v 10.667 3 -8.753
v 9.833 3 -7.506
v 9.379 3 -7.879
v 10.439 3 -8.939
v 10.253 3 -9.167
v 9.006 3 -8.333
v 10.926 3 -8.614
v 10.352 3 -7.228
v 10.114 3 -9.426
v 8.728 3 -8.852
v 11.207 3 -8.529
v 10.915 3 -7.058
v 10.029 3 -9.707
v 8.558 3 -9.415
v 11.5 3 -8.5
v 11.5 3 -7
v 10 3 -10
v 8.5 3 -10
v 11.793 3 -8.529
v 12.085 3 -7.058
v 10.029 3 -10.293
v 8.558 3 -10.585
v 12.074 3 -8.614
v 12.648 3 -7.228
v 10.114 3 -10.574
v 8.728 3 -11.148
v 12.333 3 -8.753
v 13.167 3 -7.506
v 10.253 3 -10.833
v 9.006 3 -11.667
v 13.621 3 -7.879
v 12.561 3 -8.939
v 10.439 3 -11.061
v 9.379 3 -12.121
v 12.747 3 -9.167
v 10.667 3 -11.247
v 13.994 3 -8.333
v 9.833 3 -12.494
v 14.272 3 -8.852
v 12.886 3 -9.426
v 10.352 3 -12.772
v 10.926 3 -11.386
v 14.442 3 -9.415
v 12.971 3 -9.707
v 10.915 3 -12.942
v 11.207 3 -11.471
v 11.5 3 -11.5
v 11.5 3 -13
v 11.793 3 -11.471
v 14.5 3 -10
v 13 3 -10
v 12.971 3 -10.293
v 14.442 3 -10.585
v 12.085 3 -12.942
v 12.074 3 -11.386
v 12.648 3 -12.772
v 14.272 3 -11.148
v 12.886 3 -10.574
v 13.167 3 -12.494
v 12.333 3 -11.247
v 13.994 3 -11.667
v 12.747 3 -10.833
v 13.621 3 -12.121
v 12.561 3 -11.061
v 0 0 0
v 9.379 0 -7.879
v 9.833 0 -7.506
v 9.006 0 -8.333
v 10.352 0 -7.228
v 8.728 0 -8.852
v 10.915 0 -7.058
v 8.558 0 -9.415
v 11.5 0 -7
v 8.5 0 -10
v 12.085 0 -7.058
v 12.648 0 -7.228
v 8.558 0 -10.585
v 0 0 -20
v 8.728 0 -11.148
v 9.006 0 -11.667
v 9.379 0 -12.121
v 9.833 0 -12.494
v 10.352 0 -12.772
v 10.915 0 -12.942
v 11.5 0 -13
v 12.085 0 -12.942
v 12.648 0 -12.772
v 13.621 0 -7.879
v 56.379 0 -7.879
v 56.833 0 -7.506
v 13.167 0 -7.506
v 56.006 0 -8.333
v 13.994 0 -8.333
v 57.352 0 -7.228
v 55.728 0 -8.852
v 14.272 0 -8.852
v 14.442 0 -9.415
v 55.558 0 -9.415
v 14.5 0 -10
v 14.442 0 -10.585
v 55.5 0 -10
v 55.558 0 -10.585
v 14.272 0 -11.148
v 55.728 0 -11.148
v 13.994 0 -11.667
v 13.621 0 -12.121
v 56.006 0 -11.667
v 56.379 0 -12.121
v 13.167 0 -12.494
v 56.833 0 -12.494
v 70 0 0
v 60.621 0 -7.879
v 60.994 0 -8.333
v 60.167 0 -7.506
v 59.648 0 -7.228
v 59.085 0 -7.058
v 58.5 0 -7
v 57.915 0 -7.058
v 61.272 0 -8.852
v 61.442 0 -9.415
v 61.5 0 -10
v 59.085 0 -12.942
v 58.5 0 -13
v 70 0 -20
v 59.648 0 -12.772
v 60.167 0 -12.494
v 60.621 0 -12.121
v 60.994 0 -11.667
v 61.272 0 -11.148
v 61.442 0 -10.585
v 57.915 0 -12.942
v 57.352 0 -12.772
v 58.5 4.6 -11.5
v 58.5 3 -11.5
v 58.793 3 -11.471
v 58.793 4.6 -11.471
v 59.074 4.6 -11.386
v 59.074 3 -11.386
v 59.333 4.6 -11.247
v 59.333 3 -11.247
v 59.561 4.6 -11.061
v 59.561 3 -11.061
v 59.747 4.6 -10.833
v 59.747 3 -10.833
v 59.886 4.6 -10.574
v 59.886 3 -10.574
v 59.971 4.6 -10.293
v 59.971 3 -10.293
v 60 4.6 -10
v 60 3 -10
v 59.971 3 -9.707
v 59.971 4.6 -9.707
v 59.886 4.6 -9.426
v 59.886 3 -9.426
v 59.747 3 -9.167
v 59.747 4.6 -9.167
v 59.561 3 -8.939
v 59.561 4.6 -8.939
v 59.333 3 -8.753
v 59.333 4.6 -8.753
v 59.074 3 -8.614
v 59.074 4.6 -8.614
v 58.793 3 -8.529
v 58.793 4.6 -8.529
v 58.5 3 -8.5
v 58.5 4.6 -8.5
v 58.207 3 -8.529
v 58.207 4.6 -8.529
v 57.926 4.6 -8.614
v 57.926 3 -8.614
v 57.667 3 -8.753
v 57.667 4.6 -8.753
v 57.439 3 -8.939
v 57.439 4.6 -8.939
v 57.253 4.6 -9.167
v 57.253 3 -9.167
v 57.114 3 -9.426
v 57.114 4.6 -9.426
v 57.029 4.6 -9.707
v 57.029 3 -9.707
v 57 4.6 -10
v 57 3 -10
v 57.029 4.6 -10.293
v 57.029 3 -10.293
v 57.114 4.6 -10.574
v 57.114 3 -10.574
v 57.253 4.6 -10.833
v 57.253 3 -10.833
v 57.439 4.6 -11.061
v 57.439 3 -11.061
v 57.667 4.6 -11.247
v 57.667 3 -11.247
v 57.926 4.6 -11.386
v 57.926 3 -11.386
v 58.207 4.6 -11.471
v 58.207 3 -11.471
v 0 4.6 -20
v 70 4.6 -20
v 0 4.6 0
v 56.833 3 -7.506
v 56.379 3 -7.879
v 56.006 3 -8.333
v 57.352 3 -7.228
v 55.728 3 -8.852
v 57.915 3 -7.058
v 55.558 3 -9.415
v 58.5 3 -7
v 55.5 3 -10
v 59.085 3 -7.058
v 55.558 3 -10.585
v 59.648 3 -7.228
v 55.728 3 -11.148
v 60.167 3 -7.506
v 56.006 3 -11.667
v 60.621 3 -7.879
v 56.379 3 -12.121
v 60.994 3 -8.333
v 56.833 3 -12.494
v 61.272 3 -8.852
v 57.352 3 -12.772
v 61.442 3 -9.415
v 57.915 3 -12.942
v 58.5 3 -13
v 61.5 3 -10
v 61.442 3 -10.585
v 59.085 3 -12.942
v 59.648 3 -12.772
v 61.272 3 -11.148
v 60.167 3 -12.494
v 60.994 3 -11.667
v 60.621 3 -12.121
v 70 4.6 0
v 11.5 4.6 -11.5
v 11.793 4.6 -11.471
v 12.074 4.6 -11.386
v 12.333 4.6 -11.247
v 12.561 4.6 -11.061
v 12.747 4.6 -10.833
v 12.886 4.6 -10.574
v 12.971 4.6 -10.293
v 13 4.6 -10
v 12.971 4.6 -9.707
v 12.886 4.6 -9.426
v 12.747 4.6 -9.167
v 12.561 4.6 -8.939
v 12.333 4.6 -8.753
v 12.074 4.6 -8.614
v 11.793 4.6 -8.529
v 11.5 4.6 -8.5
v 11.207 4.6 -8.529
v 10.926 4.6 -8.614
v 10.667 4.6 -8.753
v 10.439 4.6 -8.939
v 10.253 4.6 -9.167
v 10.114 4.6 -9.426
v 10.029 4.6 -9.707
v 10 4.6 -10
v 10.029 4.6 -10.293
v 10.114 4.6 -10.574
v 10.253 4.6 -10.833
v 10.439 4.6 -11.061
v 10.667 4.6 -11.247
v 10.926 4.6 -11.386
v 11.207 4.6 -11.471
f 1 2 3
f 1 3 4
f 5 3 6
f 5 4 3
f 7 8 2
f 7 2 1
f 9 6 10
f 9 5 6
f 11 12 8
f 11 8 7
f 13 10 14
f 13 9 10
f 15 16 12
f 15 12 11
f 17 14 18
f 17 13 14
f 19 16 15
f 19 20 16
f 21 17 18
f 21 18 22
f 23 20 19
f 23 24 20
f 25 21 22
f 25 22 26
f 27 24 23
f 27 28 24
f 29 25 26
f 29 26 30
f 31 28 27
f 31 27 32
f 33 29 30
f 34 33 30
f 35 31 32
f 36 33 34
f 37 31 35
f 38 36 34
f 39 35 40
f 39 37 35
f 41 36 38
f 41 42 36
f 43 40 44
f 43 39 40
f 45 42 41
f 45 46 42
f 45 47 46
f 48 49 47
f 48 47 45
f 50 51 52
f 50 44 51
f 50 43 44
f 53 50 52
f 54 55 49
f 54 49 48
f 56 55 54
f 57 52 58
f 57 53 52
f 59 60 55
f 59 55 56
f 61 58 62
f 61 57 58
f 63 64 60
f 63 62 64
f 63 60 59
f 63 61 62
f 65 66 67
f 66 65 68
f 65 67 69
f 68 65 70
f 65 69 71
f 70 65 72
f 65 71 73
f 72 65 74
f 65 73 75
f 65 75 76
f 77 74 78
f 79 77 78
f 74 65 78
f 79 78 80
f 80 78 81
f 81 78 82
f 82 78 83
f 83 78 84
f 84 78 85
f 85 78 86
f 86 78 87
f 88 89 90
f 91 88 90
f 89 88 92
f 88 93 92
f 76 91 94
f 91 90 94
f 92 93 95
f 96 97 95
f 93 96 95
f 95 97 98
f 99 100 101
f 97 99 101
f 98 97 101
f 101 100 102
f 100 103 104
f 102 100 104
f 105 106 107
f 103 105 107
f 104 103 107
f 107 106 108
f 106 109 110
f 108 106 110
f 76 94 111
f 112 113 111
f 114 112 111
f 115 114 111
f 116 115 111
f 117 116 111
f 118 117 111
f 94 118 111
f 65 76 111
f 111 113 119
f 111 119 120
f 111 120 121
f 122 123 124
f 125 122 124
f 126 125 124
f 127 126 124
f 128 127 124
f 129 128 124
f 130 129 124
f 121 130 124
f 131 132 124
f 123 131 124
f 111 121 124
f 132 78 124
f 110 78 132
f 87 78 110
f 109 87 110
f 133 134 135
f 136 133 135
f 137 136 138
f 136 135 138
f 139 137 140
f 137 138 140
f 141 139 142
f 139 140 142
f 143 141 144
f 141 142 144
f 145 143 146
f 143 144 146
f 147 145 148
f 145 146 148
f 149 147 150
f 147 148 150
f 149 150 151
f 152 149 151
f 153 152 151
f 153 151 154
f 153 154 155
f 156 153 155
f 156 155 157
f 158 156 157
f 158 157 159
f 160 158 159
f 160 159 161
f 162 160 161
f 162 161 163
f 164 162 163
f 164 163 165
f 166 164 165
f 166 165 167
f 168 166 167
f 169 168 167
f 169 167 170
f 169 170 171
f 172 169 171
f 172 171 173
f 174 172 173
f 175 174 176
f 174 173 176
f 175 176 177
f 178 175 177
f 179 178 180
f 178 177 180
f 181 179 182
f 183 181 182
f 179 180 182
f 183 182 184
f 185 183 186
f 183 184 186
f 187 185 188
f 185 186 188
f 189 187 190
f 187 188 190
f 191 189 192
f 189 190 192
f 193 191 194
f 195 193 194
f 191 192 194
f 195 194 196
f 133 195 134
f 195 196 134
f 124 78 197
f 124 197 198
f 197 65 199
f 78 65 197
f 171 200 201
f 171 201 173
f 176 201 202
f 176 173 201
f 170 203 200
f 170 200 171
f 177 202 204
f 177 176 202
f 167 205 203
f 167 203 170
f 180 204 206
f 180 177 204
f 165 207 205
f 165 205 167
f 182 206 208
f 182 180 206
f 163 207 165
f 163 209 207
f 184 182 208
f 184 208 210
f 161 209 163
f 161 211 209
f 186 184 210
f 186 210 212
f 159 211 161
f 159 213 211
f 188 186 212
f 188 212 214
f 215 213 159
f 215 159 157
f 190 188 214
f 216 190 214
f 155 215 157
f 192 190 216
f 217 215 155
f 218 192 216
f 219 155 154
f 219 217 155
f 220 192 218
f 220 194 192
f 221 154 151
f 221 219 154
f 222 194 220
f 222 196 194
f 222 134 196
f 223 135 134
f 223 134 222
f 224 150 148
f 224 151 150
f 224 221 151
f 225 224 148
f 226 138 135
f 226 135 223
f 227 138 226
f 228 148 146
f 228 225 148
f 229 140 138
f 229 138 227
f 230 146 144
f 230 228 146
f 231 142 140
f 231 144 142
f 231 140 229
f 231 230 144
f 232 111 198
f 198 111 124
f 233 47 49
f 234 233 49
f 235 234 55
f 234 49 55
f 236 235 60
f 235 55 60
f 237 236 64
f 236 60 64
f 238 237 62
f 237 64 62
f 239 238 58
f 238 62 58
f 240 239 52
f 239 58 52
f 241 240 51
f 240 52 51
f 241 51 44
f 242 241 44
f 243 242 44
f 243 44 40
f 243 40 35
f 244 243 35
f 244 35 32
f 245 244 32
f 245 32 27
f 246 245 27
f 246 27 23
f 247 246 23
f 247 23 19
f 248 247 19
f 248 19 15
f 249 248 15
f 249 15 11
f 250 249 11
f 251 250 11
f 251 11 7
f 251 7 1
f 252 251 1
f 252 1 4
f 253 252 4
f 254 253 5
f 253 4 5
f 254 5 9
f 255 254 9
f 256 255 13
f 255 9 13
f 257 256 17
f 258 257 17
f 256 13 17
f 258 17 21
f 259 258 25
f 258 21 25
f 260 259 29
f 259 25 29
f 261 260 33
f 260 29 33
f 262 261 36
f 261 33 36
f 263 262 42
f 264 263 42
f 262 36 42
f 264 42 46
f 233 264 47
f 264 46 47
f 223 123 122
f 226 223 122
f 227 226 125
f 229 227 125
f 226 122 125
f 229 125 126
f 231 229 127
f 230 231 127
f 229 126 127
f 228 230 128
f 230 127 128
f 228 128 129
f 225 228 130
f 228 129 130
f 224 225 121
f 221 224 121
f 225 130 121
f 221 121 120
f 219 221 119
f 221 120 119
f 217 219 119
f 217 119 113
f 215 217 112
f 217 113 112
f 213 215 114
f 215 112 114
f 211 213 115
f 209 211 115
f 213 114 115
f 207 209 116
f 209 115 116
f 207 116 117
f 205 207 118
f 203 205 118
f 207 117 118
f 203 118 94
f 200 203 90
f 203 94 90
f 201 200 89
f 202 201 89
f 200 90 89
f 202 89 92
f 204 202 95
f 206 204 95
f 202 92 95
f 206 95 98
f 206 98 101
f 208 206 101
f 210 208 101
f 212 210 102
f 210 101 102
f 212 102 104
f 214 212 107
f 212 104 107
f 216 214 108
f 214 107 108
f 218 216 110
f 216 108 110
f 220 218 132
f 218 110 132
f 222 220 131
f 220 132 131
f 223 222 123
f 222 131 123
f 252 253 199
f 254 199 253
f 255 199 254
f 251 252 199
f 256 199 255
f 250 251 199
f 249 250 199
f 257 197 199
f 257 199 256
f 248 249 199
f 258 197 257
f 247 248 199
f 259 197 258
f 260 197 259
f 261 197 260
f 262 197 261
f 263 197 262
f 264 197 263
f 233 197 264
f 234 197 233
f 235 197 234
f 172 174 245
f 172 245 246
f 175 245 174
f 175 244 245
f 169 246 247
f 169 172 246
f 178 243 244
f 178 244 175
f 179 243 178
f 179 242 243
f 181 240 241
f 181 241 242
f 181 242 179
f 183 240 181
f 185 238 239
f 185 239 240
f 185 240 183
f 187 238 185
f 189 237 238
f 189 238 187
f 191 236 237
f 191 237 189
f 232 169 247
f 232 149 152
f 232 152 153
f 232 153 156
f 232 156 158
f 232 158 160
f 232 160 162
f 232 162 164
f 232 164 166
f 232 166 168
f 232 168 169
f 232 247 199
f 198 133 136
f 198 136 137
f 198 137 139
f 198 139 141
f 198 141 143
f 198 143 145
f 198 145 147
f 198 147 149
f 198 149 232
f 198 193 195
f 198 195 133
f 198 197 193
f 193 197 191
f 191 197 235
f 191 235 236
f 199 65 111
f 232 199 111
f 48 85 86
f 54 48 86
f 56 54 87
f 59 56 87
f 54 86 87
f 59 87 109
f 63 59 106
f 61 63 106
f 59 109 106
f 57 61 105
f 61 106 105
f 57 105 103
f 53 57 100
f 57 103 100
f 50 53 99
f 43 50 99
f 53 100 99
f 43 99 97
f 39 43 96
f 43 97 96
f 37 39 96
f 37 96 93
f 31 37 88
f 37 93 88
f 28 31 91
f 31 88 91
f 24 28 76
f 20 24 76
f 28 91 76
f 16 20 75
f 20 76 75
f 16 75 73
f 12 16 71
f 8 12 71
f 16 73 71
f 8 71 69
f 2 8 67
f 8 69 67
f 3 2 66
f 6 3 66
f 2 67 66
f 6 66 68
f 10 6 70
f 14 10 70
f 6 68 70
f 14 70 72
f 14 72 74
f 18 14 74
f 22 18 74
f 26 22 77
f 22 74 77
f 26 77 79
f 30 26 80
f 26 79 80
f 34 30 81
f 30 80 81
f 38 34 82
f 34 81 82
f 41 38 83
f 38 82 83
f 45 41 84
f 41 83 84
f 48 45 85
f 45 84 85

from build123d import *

# Parameters (mm, degrees)
IZIM1_W                     = 70
IZIM1_H                     = 20
Y_KSEKLIK_EKSTR_ZYON1_DEPTH = 4.6
IZIM2_R                     = 1.5
KES_EKSTR_ZYON1_DEPTH       = 4.6
IZIM3_R                     = 3
KES_EKSTR_ZYON2_DEPTH       = 3


with BuildPart() as part:
    # Çizim1 → Yükseklik-Ekstrüzyon1 (new body)
    with BuildSketch(Plane(origin=(0, 0, 0), x_dir=(1, 0, 0), z_dir=(0, 1, 0))):
        with Locations((35, 10)):
            Rectangle(IZIM1_W, IZIM1_H)
    extrude(amount=Y_KSEKLIK_EKSTR_ZYON1_DEPTH)

    # Çizim2 → Kes-Ekstrüzyon1 (cut)
    with BuildSketch(Plane.XZ):
        with Locations(Location((58.5, -10, 0), (0, 0, 270))):
            Circle(IZIM2_R)
        with Locations(Location((11.5, -10, 0), (0, 0, 270))):
            Circle(IZIM2_R)
    extrude(amount=-KES_EKSTR_ZYON1_DEPTH, mode=Mode.SUBTRACT)

    # Çizim3 → Kes-Ekstrüzyon2 (cut)
    with BuildSketch(Plane.XZ):
        with Locations(Location((11.5, -10, 0), (0, 0, 270))):
            Circle(IZIM3_R)
        with Locations(Location((58.5, -10, 0), (0, 0, 270))):
            Circle(IZIM3_R)
    extrude(amount=-KES_EKSTR_ZYON2_DEPTH, mode=Mode.SUBTRACT)


solid = part.part
